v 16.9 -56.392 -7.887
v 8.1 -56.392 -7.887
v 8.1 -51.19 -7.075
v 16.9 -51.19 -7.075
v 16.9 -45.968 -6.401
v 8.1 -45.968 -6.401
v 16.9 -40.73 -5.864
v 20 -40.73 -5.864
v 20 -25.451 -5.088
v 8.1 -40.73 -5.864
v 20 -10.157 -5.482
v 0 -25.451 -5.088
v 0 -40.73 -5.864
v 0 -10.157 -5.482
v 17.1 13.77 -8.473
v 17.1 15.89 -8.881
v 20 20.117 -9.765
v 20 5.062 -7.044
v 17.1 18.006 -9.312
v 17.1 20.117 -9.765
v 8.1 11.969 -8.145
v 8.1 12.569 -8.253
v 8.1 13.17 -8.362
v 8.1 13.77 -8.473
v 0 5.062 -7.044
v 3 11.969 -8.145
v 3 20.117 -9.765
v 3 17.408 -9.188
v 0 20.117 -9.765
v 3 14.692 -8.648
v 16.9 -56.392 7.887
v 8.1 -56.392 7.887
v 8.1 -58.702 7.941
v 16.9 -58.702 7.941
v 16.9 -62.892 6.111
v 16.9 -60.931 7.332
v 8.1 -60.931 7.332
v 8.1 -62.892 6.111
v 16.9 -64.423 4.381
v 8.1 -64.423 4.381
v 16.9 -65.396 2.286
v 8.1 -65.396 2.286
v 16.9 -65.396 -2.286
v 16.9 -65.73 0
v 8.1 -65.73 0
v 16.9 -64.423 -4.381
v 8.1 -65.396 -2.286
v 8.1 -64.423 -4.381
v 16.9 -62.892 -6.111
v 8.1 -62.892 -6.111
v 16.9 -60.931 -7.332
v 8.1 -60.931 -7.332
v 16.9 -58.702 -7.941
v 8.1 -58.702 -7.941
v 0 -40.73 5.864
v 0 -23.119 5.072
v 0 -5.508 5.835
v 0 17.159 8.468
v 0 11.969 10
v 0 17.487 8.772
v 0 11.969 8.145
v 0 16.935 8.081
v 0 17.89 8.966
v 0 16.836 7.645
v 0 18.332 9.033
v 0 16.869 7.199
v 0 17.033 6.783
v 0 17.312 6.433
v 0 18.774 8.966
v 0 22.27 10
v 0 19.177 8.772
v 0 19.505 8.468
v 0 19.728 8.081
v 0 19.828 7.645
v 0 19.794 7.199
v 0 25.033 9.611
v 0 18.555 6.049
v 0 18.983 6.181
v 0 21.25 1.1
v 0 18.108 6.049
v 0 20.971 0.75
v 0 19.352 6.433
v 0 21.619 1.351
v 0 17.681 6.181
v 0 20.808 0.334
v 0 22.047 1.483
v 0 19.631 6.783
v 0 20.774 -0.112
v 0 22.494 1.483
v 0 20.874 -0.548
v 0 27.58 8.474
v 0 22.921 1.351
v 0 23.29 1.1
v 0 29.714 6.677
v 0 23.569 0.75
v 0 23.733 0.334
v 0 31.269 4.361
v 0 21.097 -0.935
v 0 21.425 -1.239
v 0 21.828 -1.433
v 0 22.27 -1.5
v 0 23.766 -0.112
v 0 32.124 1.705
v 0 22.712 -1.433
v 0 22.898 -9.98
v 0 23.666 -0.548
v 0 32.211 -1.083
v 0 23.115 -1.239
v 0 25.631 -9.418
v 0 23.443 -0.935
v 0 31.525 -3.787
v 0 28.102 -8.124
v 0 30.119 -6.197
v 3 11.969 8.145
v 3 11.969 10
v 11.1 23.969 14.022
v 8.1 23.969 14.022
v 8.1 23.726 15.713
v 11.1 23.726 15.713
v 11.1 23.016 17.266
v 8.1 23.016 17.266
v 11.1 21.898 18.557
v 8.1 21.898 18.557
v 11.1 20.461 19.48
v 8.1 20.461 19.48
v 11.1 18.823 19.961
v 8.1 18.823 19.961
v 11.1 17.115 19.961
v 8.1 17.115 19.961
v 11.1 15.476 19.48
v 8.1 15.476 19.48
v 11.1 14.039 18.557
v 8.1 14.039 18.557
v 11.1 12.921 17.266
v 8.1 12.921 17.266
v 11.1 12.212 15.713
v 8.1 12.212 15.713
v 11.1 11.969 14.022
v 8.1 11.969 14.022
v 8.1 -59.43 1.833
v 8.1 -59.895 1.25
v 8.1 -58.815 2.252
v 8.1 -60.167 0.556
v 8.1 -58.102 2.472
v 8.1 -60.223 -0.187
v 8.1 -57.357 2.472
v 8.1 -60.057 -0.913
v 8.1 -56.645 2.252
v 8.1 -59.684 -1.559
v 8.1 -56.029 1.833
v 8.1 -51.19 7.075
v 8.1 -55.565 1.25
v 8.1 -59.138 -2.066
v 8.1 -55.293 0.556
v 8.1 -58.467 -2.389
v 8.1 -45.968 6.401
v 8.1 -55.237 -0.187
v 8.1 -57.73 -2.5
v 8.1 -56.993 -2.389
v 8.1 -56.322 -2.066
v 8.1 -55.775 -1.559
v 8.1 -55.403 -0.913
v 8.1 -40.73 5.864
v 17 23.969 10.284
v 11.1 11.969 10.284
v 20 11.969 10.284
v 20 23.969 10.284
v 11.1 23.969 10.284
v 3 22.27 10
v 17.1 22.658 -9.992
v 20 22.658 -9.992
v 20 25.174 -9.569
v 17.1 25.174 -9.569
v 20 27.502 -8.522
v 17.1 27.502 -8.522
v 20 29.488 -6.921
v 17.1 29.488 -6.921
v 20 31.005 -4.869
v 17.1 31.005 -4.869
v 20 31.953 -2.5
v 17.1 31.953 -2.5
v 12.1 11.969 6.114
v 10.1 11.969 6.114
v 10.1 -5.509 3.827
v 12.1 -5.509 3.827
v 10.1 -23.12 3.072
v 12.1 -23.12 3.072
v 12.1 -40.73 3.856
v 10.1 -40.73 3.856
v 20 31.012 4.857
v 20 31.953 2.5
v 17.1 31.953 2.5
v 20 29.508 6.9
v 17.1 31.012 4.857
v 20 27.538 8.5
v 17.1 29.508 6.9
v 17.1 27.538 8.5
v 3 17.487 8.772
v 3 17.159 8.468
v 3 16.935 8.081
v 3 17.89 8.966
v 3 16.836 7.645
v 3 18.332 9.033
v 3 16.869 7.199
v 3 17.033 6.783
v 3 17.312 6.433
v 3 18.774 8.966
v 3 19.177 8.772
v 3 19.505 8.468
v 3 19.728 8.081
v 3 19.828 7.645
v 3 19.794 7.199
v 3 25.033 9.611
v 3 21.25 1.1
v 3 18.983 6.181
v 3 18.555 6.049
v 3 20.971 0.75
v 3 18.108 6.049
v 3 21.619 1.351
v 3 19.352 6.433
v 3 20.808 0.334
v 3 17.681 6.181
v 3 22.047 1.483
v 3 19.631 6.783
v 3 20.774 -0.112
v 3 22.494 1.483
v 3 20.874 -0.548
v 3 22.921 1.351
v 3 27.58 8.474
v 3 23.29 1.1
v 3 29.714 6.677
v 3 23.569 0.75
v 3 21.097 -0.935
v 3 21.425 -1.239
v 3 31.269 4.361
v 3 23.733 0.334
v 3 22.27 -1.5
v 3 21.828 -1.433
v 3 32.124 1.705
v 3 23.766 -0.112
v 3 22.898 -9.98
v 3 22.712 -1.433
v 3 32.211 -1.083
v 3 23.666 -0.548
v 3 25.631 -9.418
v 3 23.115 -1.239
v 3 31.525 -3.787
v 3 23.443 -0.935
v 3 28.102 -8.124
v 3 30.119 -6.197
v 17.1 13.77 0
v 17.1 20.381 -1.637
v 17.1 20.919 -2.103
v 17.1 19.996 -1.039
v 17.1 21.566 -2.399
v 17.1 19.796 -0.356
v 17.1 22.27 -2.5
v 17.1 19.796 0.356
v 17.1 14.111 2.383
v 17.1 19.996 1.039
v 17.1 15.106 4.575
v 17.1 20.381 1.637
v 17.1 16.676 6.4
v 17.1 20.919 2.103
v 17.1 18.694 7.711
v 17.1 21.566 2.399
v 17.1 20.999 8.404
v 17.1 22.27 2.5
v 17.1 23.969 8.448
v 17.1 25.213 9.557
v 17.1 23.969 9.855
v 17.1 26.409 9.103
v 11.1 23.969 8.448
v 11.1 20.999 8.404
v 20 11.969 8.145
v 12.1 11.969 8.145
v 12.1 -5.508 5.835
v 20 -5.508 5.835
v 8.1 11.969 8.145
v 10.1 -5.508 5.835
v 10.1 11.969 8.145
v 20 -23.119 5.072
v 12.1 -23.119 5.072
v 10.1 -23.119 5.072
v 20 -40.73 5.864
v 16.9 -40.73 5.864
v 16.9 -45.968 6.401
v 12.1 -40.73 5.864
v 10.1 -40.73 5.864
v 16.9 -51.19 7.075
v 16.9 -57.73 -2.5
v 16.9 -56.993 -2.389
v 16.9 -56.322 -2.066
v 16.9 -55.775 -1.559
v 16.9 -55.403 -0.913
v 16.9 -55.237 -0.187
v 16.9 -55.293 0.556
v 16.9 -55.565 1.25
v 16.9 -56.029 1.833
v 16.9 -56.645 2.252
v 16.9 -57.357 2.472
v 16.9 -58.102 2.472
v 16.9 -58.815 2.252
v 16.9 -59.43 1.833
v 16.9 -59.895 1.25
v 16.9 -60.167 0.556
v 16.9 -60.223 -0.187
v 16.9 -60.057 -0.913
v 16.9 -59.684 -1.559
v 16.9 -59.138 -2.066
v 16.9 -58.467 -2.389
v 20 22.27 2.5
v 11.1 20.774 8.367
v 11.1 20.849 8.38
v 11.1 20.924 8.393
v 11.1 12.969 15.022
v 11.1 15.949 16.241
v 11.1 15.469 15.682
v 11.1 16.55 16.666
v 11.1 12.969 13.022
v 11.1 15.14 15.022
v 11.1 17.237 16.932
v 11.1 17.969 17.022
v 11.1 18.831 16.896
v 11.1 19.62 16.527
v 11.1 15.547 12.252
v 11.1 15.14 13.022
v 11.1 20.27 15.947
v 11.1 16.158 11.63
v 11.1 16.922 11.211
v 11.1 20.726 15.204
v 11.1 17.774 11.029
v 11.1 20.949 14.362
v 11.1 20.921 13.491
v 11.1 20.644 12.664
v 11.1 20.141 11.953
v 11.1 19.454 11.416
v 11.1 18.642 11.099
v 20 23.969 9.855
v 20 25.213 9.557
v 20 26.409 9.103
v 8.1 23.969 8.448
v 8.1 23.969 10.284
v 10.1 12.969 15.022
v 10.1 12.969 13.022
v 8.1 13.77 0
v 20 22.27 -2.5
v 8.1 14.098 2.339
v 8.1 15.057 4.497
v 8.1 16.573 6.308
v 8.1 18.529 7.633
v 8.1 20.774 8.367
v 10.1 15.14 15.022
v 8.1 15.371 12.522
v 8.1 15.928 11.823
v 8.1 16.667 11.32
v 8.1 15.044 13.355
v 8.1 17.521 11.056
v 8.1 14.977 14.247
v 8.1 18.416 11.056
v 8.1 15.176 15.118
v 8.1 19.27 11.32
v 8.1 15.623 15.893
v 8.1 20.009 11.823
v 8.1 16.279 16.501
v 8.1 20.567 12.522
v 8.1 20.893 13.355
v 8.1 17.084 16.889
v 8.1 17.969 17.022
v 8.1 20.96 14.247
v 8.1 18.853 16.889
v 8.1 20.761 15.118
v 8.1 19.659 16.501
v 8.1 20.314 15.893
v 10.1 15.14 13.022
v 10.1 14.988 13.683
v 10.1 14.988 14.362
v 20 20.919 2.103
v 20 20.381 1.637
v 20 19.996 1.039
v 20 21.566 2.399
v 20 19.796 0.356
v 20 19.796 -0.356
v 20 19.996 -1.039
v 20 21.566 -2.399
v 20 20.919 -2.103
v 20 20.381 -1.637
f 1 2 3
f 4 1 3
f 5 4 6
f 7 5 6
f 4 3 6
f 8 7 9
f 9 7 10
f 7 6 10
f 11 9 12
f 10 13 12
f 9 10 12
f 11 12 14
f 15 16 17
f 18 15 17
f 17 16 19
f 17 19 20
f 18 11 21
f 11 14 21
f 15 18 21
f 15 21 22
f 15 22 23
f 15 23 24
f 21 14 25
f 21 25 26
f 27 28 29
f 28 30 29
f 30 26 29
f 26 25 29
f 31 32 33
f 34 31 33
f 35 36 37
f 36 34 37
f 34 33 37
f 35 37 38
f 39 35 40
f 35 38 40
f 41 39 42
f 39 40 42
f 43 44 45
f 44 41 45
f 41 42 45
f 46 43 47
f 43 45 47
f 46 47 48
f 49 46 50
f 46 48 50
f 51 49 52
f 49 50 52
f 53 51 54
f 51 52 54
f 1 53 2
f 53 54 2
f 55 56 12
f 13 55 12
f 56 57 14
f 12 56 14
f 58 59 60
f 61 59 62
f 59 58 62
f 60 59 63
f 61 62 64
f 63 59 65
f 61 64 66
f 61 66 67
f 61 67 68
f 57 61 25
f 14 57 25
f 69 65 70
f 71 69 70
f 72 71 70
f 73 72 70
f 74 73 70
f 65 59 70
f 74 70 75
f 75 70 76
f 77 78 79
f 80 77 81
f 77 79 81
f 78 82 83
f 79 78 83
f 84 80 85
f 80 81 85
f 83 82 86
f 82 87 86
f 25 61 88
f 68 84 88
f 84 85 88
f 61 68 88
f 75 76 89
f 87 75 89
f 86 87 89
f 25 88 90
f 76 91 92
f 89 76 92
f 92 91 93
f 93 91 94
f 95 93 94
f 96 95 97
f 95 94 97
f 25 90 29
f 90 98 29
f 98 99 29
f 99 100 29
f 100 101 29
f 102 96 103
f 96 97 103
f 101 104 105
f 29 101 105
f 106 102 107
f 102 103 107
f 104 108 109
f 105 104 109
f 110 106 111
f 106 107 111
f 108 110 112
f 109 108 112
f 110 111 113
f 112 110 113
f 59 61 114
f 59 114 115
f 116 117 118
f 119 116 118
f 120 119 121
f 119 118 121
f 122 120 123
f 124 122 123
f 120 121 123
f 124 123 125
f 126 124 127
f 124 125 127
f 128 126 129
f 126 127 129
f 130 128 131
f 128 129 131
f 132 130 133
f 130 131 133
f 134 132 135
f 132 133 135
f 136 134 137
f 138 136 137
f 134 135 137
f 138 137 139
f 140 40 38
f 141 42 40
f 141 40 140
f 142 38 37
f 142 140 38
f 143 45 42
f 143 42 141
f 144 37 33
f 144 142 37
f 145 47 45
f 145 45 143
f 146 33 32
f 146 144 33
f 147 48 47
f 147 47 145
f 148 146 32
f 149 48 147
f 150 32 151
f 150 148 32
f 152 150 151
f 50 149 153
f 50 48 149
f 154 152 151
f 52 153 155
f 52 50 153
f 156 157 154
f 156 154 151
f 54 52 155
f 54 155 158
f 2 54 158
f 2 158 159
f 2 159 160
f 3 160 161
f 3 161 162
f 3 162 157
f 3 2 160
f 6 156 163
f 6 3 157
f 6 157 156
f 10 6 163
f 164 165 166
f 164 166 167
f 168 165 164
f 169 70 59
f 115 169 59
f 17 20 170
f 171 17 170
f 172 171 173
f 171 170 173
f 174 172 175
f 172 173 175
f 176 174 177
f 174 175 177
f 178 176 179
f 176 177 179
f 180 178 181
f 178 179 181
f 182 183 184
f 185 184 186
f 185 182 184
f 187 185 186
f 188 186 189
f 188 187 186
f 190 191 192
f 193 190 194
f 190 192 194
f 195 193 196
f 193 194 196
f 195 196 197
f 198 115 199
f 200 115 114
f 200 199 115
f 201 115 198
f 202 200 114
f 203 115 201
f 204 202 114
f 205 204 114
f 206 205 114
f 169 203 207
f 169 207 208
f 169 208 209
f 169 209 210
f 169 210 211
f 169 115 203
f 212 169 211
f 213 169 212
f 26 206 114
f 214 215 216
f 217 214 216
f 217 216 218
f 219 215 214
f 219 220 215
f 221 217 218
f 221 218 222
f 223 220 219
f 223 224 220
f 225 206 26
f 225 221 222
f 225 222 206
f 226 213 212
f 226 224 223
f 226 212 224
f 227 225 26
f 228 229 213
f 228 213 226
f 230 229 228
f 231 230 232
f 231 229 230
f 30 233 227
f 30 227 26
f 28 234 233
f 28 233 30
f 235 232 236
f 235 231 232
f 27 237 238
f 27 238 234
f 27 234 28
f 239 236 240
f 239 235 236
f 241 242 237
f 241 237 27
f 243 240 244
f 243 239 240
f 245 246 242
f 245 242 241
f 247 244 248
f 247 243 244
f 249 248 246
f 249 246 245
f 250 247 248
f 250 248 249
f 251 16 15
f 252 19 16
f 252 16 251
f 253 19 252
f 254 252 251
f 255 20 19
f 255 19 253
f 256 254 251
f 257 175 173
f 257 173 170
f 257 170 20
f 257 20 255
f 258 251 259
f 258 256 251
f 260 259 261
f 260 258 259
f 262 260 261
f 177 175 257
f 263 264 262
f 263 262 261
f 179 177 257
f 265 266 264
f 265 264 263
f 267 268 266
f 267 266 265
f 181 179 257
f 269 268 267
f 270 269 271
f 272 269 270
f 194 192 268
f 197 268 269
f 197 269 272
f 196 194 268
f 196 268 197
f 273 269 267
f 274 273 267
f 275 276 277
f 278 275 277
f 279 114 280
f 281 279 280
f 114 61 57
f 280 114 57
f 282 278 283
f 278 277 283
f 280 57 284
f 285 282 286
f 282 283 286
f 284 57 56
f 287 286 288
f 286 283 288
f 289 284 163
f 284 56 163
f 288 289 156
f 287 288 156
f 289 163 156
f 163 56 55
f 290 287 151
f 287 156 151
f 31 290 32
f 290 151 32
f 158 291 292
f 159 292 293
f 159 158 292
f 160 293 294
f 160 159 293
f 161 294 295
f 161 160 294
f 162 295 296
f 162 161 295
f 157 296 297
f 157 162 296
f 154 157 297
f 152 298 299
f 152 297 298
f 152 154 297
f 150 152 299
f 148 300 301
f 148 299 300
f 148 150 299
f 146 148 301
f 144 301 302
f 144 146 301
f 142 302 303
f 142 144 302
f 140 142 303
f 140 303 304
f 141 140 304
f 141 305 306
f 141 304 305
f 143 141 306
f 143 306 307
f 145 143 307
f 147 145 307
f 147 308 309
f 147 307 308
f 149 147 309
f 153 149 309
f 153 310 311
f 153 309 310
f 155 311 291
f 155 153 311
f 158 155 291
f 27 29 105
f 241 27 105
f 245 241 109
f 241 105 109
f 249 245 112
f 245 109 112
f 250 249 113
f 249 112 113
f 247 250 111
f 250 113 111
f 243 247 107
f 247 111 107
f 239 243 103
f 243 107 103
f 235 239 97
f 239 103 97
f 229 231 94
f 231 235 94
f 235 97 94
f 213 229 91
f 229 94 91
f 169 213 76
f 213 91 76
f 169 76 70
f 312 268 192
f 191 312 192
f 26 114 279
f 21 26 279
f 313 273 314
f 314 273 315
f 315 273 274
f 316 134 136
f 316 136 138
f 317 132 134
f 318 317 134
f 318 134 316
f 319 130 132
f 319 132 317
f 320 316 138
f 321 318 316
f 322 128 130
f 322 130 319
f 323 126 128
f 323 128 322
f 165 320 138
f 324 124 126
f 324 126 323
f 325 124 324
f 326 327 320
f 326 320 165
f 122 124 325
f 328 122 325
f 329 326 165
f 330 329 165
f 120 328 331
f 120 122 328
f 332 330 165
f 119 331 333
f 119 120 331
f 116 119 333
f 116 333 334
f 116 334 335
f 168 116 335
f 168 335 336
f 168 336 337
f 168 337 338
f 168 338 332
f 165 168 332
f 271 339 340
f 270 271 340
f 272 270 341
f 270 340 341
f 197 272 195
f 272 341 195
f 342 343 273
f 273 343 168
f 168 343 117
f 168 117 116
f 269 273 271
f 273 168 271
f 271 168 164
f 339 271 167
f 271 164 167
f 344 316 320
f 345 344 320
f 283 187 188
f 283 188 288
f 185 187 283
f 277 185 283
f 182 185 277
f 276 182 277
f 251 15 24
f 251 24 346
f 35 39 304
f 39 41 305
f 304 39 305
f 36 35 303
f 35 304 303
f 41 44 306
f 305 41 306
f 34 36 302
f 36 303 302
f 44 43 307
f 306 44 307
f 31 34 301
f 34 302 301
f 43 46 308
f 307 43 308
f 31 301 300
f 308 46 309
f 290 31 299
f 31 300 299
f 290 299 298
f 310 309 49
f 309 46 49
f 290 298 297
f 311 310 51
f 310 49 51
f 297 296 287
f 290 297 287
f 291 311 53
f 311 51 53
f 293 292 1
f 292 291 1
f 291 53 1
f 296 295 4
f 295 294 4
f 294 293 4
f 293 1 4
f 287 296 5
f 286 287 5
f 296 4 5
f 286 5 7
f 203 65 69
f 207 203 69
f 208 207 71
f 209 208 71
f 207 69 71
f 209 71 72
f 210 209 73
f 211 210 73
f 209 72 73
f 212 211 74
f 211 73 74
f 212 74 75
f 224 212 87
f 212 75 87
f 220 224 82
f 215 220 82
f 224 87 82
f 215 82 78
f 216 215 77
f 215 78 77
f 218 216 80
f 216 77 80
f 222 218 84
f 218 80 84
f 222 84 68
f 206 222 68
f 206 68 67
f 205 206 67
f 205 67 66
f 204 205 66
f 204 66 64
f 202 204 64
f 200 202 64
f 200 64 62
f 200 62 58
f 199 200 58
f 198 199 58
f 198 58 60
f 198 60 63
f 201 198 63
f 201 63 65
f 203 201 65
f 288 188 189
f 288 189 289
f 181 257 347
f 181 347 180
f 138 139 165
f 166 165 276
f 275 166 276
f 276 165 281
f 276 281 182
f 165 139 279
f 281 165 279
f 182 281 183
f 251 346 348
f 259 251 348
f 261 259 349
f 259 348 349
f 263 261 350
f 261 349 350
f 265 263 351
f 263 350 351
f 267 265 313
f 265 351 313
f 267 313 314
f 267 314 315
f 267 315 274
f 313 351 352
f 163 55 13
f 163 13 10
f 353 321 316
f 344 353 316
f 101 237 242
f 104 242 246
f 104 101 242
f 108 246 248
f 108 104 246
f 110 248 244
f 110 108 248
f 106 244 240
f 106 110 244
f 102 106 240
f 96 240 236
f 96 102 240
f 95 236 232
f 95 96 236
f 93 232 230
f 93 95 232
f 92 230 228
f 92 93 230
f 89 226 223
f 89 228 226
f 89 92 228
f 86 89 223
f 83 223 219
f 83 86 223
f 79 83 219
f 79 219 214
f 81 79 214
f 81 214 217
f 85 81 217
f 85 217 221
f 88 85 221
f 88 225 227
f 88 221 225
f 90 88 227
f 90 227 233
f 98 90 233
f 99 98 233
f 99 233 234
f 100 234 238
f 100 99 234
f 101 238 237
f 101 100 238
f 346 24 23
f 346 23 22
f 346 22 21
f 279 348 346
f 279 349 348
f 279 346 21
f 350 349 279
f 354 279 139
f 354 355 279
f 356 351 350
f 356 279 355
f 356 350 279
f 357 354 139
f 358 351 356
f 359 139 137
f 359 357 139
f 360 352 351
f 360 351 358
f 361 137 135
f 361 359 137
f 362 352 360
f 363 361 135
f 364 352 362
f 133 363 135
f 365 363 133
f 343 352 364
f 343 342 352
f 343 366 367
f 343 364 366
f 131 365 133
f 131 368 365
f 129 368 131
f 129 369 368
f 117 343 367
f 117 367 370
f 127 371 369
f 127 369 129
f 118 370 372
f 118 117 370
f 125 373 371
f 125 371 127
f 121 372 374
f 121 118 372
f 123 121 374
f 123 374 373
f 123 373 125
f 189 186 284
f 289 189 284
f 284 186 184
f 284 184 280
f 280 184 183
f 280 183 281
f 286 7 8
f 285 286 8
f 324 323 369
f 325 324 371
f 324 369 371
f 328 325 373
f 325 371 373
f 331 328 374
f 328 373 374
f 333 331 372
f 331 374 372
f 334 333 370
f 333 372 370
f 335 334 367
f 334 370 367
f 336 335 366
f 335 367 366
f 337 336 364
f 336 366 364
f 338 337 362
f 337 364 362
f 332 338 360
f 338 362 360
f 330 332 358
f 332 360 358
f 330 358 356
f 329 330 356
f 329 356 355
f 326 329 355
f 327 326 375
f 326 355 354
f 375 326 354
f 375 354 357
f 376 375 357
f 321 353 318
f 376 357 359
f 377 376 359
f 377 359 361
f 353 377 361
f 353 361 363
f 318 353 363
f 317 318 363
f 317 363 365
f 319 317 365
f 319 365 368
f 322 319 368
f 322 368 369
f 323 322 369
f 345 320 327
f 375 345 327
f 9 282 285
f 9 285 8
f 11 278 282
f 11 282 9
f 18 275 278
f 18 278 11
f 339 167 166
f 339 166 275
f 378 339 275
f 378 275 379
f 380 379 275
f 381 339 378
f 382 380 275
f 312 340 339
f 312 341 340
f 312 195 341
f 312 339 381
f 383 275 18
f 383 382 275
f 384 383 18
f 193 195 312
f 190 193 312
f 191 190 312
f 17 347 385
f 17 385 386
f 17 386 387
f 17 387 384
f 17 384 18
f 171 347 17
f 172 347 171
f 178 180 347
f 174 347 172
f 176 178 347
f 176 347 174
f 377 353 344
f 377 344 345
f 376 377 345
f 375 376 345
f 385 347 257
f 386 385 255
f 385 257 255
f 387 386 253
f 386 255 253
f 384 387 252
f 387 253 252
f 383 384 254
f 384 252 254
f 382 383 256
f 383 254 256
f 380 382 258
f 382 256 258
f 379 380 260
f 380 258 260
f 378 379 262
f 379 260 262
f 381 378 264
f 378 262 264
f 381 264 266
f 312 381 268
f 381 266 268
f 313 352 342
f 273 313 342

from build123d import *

# Parameters (mm, degrees)
SKETCH1_R                = 1.5
SKETCH1_R_2              = 2.5
BOSS_EXTRUDE1_DEPTH      = 20
SKETCH2_W                = 8.1
SKETCH2_H                = 25
SKETCH2_W_2              = 3.1
SKETCH2_W_3              = 5.1
SKETCH2_H_2              = 20
CUT_EXTRUDE1_DEPTH       = 20
CUT_EXTRUDE1_DEPTH_BACK  = 20
CUT_EXTRUDE2_DEPTH       = 9
BOSS_EXTRUDE2_DEPTH      = 11.9
SKETCH5_R                = 3
BOSS_EXTRUDE3_DEPTH      = 3
CUT_EXTRUDE6_DEPTH       = 1
SKETCH13_R               = 2.5
CUT_EXTRUDE7_DEPTH       = 4
CUT_EXTRUDE5_START       = 5
CUT_EXTRUDE5_DEPTH       = 2
CUT_EXTRUDE8_REACH       = 22
SKETCH14_R               = 1.5
BOSS_EXTRUDE4_DEPTH      = 3
CUT_EXTRUDE9_DEPTH       = 3
SKETCH17_W               = 9
SKETCH17_H               = 3.569322199
CUT_EXTRUDE11_DEPTH      = 3
SKETCH18_W               = 5.770974844
SKETCH18_H               = 0.772936936
BOSS_EXTRUDE5_DEPTH      = 8.9
BOSS_EXTRUDE5_DEPTH_BACK = 1
SKETCH19_W               = 5.1
SKETCH19_H               = 16.397725614
CUT_EXTRUDE12_DEPTH      = 0.301495
SKETCH20_W               = 5
SKETCH20_H               = 12.419235667
CUT_EXTRUDE13_DEPTH      = 10


with BuildPart() as part:
    # Sketch1 → Boss-Extrude1 (new body)
    with BuildSketch(Plane(origin=(0, 0, 0), x_dir=(0, 0, -1), z_dir=(1, 0, 0))):
        with BuildLine():
            ThreePointArc((9.765353557, 20.116545894), (0, 32.270117322), (-9.765353557, 20.116545894))
            ThreePointArc((-9.765353557, 20.116545894), (-5.132645827, -18.047253777), (-7.88740095, -56.392382678))
            ThreePointArc((-7.88740095, -56.392382678), (0, -65.729882678), (7.88740095, -56.392382678))
            ThreePointArc((7.88740095, -56.392382678), (5.132645827, -18.047253777), (9.765353557, 20.116545894))
        make_face()
        with Locations((0, 22.270117322)):
            Circle(SKETCH1_R, mode=Mode.SUBTRACT)
        with Locations((0, -57.729882678)):
            Circle(SKETCH1_R_2, mode=Mode.SUBTRACT)
    extrude(amount=BOSS_EXTRUDE1_DEPTH)

    # Sketch2 → Cut-Extrude1 (cut, two sides)
    with BuildSketch(Plane.XY) as cut_extrude1_sk:
        with Locations((4.05, -53.229882678)):
            Rectangle(SKETCH2_W, SKETCH2_H)
        with Locations((18.45, -53.229882678)):
            Rectangle(SKETCH2_W_2, SKETCH2_H)
        with Locations((5.55, 22.270117322)):
            Rectangle(SKETCH2_W_3, SKETCH2_H_2)
    extrude(amount=CUT_EXTRUDE1_DEPTH, mode=Mode.SUBTRACT)
    extrude(cut_extrude1_sk.sketch, amount=-CUT_EXTRUDE1_DEPTH_BACK, mode=Mode.SUBTRACT)

    # Sketch3 → Cut-Extrude2 (cut)
    with BuildSketch(Plane.ZY.offset(-8.1)):
        with BuildLine():
            Line((8.5, 22.270117322), (8.5, 40.909533312))
            Line((8.5, 40.909533312), (-17.52872033, 40.909533312))
            Line((-17.52872033, 40.909533312), (-17.52872033, 13.770117322))
            Line((-17.52872033, 13.770117322), (0, 13.770117322))
            ThreePointArc((0, 13.770117322), (6.01040764, 16.259709682), (8.5, 22.270117322))
        make_face()
    extrude(amount=-CUT_EXTRUDE2_DEPTH, mode=Mode.SUBTRACT)

    # Sketch4 → Boss-Extrude2 (add, through all)
    with BuildSketch(Plane.ZY.offset(-8.1)):
        Polygon((8.5, 27.537944199), (8.283796844, 12.741558936), (10.283796844, 12.741558936), (10.283796844, 27.537944199), align=None)
    extrude(amount=-BOSS_EXTRUDE2_DEPTH)

    # Sketch5 → Boss-Extrude3 (add)
    with BuildSketch(Plane.ZY.offset(-8.1)):
        with BuildLine():
            Line((8.145156861, 11.968622), (8.447845456, 23.968622))
            Line((8.447845456, 23.968622), (9.854698466, 23.968622))
            Line((9.854698466, 23.968622), (14.022421388, 23.968622))
            ThreePointArc((14.022421388, 23.968622), (20.022421388, 17.968622), (14.022421388, 11.968622))
            Line((14.022421388, 11.968622), (8.145156861, 11.968622))
        make_face()
        with Locations((14.022421388, 17.968622)):
            Circle(SKETCH5_R, mode=Mode.SUBTRACT)
    extrude(amount=-BOSS_EXTRUDE3_DEPTH)

    # Sketch12 → Cut-Extrude6 (cut)
    with BuildSketch(Plane(origin=(11.1, 0, 0), x_dir=(0, 0, -1), z_dir=(1, 0, 0))):
        Polygon((-15.022421388, 13.968622), (-15.022421388, 12.968622), (-13.022421388, 12.968622), (-13.022421388, 13.968622), (-13.022421388, 15.140194875), (-14.022421388, 15.140194875), (-15.022421388, 15.140194875), align=None)
    extrude(amount=-CUT_EXTRUDE6_DEPTH, mode=Mode.SUBTRACT)

    # Sketch13 → Cut-Extrude7 (cut)
    with BuildSketch(Plane.ZY.offset(-17.1)):
        with Locations((0, 22.270117322)):
            Circle(SKETCH13_R)
    extrude(amount=-CUT_EXTRUDE7_DEPTH, mode=Mode.SUBTRACT)

    # Sketch10 → Cut-Extrude5 (cut)
    with BuildSketch(Plane.ZY.offset(-17.1).offset(CUT_EXTRUDE5_START)):
        with BuildLine():
            Line((8.283796844, 12.741558936), (6.251490054, 12.741558936))
            ThreePointArc((6.251490054, 12.741558936), (3.274825885, -13.914467314), (3.856000489, -40.729882678))
            Line((3.856000489, -40.729882678), (5.863867222, -40.729882678))
            Line((5.863867222, -40.729882678), (7.833024243, -40.729882678))
            Line((7.833024243, -40.729882678), (8.283796844, 12.741558936))
        make_face()
    extrude(amount=CUT_EXTRUDE5_DEPTH, mode=Mode.SUBTRACT)

    # Sketch14 → Cut-Extrude8 (cut, up to next)
    with BuildSketch(Plane.ZY, mode=Mode.PRIVATE) as cut_extrude8_sk1:
        with Locations((7.532575614, 18.331804915)):
            Circle(SKETCH14_R)
    cut_extrude8_tool1 = extrude(cut_extrude8_sk1.sketch, amount=-CUT_EXTRUDE8_REACH, mode=Mode.PRIVATE) & part.part
    add(cut_extrude8_tool1.solids().sort_by_distance((0, 18.331805, 7.532576))[0], mode=Mode.SUBTRACT)

    # Sketch15 → Boss-Extrude4 (add)
    with BuildSketch(Plane.ZY):
        Polygon((10, 22.270117322), (10, 11.968622), (8.145156861, 11.968622), (7.595672539, 11.968622), align=None)
    extrude(amount=-BOSS_EXTRUDE4_DEPTH)

    # Sketch16 → Cut-Extrude9 (cut)
    with BuildSketch(Plane(origin=(20, 0, 0), x_dir=(0, 0, -1), z_dir=(1, 0, 0))):
        with BuildLine():
            Line((-10.283796844, 23.968622), (-9.854698466, 23.968622))
            ThreePointArc((-9.854698466, 23.968622), (-9.349264901, 25.818531871), (-8.5, 27.537944199))
            Line((-8.5, 27.537944199), (-10.283796844, 27.537944199))
            Line((-10.283796844, 27.537944199), (-10.283796844, 23.968622))
        make_face()
    extrude(amount=-CUT_EXTRUDE9_DEPTH, mode=Mode.SUBTRACT)

    # Sketch17 → Cut-Extrude11 (cut)
    with BuildSketch(Plane.XY.offset(10.283796844)):
        with Locations((12.6, 25.7532831)):
            Rectangle(SKETCH17_W, SKETCH17_H)
    extrude(amount=-CUT_EXTRUDE11_DEPTH, mode=Mode.SUBTRACT)

    # Sketch18 → Boss-Extrude5 (add, two sides)
    with BuildSketch(Plane(origin=(11.1, 0, 0), x_dir=(0, 0, -1), z_dir=(1, 0, 0))) as boss_extrude5_sk:
        with Locations((-7.398309422, 12.355090468)):
            Rectangle(SKETCH18_W, SKETCH18_H)
    extrude(amount=BOSS_EXTRUDE5_DEPTH)
    extrude(boss_extrude5_sk.sketch, amount=-BOSS_EXTRUDE5_DEPTH_BACK)

    # Sketch19 → Cut-Extrude12 (cut)
    with BuildSketch(Plane(origin=(0, 12.270117322, 0), x_dir=(1, 0, 0), z_dir=(0, 1, 0))):
        with Locations((5.55, 0)):
            Rectangle(SKETCH19_W, SKETCH19_H)
    extrude(amount=-CUT_EXTRUDE12_DEPTH, mode=Mode.SUBTRACT)

    # Sketch20 → Cut-Extrude13 (cut)
    with BuildSketch(Plane.ZY.offset(-17.1)):
        with Locations((0, 28.479735156)):
            Rectangle(SKETCH20_W, SKETCH20_H)
    extrude(amount=-CUT_EXTRUDE13_DEPTH, mode=Mode.SUBTRACT)


solid = part.part
